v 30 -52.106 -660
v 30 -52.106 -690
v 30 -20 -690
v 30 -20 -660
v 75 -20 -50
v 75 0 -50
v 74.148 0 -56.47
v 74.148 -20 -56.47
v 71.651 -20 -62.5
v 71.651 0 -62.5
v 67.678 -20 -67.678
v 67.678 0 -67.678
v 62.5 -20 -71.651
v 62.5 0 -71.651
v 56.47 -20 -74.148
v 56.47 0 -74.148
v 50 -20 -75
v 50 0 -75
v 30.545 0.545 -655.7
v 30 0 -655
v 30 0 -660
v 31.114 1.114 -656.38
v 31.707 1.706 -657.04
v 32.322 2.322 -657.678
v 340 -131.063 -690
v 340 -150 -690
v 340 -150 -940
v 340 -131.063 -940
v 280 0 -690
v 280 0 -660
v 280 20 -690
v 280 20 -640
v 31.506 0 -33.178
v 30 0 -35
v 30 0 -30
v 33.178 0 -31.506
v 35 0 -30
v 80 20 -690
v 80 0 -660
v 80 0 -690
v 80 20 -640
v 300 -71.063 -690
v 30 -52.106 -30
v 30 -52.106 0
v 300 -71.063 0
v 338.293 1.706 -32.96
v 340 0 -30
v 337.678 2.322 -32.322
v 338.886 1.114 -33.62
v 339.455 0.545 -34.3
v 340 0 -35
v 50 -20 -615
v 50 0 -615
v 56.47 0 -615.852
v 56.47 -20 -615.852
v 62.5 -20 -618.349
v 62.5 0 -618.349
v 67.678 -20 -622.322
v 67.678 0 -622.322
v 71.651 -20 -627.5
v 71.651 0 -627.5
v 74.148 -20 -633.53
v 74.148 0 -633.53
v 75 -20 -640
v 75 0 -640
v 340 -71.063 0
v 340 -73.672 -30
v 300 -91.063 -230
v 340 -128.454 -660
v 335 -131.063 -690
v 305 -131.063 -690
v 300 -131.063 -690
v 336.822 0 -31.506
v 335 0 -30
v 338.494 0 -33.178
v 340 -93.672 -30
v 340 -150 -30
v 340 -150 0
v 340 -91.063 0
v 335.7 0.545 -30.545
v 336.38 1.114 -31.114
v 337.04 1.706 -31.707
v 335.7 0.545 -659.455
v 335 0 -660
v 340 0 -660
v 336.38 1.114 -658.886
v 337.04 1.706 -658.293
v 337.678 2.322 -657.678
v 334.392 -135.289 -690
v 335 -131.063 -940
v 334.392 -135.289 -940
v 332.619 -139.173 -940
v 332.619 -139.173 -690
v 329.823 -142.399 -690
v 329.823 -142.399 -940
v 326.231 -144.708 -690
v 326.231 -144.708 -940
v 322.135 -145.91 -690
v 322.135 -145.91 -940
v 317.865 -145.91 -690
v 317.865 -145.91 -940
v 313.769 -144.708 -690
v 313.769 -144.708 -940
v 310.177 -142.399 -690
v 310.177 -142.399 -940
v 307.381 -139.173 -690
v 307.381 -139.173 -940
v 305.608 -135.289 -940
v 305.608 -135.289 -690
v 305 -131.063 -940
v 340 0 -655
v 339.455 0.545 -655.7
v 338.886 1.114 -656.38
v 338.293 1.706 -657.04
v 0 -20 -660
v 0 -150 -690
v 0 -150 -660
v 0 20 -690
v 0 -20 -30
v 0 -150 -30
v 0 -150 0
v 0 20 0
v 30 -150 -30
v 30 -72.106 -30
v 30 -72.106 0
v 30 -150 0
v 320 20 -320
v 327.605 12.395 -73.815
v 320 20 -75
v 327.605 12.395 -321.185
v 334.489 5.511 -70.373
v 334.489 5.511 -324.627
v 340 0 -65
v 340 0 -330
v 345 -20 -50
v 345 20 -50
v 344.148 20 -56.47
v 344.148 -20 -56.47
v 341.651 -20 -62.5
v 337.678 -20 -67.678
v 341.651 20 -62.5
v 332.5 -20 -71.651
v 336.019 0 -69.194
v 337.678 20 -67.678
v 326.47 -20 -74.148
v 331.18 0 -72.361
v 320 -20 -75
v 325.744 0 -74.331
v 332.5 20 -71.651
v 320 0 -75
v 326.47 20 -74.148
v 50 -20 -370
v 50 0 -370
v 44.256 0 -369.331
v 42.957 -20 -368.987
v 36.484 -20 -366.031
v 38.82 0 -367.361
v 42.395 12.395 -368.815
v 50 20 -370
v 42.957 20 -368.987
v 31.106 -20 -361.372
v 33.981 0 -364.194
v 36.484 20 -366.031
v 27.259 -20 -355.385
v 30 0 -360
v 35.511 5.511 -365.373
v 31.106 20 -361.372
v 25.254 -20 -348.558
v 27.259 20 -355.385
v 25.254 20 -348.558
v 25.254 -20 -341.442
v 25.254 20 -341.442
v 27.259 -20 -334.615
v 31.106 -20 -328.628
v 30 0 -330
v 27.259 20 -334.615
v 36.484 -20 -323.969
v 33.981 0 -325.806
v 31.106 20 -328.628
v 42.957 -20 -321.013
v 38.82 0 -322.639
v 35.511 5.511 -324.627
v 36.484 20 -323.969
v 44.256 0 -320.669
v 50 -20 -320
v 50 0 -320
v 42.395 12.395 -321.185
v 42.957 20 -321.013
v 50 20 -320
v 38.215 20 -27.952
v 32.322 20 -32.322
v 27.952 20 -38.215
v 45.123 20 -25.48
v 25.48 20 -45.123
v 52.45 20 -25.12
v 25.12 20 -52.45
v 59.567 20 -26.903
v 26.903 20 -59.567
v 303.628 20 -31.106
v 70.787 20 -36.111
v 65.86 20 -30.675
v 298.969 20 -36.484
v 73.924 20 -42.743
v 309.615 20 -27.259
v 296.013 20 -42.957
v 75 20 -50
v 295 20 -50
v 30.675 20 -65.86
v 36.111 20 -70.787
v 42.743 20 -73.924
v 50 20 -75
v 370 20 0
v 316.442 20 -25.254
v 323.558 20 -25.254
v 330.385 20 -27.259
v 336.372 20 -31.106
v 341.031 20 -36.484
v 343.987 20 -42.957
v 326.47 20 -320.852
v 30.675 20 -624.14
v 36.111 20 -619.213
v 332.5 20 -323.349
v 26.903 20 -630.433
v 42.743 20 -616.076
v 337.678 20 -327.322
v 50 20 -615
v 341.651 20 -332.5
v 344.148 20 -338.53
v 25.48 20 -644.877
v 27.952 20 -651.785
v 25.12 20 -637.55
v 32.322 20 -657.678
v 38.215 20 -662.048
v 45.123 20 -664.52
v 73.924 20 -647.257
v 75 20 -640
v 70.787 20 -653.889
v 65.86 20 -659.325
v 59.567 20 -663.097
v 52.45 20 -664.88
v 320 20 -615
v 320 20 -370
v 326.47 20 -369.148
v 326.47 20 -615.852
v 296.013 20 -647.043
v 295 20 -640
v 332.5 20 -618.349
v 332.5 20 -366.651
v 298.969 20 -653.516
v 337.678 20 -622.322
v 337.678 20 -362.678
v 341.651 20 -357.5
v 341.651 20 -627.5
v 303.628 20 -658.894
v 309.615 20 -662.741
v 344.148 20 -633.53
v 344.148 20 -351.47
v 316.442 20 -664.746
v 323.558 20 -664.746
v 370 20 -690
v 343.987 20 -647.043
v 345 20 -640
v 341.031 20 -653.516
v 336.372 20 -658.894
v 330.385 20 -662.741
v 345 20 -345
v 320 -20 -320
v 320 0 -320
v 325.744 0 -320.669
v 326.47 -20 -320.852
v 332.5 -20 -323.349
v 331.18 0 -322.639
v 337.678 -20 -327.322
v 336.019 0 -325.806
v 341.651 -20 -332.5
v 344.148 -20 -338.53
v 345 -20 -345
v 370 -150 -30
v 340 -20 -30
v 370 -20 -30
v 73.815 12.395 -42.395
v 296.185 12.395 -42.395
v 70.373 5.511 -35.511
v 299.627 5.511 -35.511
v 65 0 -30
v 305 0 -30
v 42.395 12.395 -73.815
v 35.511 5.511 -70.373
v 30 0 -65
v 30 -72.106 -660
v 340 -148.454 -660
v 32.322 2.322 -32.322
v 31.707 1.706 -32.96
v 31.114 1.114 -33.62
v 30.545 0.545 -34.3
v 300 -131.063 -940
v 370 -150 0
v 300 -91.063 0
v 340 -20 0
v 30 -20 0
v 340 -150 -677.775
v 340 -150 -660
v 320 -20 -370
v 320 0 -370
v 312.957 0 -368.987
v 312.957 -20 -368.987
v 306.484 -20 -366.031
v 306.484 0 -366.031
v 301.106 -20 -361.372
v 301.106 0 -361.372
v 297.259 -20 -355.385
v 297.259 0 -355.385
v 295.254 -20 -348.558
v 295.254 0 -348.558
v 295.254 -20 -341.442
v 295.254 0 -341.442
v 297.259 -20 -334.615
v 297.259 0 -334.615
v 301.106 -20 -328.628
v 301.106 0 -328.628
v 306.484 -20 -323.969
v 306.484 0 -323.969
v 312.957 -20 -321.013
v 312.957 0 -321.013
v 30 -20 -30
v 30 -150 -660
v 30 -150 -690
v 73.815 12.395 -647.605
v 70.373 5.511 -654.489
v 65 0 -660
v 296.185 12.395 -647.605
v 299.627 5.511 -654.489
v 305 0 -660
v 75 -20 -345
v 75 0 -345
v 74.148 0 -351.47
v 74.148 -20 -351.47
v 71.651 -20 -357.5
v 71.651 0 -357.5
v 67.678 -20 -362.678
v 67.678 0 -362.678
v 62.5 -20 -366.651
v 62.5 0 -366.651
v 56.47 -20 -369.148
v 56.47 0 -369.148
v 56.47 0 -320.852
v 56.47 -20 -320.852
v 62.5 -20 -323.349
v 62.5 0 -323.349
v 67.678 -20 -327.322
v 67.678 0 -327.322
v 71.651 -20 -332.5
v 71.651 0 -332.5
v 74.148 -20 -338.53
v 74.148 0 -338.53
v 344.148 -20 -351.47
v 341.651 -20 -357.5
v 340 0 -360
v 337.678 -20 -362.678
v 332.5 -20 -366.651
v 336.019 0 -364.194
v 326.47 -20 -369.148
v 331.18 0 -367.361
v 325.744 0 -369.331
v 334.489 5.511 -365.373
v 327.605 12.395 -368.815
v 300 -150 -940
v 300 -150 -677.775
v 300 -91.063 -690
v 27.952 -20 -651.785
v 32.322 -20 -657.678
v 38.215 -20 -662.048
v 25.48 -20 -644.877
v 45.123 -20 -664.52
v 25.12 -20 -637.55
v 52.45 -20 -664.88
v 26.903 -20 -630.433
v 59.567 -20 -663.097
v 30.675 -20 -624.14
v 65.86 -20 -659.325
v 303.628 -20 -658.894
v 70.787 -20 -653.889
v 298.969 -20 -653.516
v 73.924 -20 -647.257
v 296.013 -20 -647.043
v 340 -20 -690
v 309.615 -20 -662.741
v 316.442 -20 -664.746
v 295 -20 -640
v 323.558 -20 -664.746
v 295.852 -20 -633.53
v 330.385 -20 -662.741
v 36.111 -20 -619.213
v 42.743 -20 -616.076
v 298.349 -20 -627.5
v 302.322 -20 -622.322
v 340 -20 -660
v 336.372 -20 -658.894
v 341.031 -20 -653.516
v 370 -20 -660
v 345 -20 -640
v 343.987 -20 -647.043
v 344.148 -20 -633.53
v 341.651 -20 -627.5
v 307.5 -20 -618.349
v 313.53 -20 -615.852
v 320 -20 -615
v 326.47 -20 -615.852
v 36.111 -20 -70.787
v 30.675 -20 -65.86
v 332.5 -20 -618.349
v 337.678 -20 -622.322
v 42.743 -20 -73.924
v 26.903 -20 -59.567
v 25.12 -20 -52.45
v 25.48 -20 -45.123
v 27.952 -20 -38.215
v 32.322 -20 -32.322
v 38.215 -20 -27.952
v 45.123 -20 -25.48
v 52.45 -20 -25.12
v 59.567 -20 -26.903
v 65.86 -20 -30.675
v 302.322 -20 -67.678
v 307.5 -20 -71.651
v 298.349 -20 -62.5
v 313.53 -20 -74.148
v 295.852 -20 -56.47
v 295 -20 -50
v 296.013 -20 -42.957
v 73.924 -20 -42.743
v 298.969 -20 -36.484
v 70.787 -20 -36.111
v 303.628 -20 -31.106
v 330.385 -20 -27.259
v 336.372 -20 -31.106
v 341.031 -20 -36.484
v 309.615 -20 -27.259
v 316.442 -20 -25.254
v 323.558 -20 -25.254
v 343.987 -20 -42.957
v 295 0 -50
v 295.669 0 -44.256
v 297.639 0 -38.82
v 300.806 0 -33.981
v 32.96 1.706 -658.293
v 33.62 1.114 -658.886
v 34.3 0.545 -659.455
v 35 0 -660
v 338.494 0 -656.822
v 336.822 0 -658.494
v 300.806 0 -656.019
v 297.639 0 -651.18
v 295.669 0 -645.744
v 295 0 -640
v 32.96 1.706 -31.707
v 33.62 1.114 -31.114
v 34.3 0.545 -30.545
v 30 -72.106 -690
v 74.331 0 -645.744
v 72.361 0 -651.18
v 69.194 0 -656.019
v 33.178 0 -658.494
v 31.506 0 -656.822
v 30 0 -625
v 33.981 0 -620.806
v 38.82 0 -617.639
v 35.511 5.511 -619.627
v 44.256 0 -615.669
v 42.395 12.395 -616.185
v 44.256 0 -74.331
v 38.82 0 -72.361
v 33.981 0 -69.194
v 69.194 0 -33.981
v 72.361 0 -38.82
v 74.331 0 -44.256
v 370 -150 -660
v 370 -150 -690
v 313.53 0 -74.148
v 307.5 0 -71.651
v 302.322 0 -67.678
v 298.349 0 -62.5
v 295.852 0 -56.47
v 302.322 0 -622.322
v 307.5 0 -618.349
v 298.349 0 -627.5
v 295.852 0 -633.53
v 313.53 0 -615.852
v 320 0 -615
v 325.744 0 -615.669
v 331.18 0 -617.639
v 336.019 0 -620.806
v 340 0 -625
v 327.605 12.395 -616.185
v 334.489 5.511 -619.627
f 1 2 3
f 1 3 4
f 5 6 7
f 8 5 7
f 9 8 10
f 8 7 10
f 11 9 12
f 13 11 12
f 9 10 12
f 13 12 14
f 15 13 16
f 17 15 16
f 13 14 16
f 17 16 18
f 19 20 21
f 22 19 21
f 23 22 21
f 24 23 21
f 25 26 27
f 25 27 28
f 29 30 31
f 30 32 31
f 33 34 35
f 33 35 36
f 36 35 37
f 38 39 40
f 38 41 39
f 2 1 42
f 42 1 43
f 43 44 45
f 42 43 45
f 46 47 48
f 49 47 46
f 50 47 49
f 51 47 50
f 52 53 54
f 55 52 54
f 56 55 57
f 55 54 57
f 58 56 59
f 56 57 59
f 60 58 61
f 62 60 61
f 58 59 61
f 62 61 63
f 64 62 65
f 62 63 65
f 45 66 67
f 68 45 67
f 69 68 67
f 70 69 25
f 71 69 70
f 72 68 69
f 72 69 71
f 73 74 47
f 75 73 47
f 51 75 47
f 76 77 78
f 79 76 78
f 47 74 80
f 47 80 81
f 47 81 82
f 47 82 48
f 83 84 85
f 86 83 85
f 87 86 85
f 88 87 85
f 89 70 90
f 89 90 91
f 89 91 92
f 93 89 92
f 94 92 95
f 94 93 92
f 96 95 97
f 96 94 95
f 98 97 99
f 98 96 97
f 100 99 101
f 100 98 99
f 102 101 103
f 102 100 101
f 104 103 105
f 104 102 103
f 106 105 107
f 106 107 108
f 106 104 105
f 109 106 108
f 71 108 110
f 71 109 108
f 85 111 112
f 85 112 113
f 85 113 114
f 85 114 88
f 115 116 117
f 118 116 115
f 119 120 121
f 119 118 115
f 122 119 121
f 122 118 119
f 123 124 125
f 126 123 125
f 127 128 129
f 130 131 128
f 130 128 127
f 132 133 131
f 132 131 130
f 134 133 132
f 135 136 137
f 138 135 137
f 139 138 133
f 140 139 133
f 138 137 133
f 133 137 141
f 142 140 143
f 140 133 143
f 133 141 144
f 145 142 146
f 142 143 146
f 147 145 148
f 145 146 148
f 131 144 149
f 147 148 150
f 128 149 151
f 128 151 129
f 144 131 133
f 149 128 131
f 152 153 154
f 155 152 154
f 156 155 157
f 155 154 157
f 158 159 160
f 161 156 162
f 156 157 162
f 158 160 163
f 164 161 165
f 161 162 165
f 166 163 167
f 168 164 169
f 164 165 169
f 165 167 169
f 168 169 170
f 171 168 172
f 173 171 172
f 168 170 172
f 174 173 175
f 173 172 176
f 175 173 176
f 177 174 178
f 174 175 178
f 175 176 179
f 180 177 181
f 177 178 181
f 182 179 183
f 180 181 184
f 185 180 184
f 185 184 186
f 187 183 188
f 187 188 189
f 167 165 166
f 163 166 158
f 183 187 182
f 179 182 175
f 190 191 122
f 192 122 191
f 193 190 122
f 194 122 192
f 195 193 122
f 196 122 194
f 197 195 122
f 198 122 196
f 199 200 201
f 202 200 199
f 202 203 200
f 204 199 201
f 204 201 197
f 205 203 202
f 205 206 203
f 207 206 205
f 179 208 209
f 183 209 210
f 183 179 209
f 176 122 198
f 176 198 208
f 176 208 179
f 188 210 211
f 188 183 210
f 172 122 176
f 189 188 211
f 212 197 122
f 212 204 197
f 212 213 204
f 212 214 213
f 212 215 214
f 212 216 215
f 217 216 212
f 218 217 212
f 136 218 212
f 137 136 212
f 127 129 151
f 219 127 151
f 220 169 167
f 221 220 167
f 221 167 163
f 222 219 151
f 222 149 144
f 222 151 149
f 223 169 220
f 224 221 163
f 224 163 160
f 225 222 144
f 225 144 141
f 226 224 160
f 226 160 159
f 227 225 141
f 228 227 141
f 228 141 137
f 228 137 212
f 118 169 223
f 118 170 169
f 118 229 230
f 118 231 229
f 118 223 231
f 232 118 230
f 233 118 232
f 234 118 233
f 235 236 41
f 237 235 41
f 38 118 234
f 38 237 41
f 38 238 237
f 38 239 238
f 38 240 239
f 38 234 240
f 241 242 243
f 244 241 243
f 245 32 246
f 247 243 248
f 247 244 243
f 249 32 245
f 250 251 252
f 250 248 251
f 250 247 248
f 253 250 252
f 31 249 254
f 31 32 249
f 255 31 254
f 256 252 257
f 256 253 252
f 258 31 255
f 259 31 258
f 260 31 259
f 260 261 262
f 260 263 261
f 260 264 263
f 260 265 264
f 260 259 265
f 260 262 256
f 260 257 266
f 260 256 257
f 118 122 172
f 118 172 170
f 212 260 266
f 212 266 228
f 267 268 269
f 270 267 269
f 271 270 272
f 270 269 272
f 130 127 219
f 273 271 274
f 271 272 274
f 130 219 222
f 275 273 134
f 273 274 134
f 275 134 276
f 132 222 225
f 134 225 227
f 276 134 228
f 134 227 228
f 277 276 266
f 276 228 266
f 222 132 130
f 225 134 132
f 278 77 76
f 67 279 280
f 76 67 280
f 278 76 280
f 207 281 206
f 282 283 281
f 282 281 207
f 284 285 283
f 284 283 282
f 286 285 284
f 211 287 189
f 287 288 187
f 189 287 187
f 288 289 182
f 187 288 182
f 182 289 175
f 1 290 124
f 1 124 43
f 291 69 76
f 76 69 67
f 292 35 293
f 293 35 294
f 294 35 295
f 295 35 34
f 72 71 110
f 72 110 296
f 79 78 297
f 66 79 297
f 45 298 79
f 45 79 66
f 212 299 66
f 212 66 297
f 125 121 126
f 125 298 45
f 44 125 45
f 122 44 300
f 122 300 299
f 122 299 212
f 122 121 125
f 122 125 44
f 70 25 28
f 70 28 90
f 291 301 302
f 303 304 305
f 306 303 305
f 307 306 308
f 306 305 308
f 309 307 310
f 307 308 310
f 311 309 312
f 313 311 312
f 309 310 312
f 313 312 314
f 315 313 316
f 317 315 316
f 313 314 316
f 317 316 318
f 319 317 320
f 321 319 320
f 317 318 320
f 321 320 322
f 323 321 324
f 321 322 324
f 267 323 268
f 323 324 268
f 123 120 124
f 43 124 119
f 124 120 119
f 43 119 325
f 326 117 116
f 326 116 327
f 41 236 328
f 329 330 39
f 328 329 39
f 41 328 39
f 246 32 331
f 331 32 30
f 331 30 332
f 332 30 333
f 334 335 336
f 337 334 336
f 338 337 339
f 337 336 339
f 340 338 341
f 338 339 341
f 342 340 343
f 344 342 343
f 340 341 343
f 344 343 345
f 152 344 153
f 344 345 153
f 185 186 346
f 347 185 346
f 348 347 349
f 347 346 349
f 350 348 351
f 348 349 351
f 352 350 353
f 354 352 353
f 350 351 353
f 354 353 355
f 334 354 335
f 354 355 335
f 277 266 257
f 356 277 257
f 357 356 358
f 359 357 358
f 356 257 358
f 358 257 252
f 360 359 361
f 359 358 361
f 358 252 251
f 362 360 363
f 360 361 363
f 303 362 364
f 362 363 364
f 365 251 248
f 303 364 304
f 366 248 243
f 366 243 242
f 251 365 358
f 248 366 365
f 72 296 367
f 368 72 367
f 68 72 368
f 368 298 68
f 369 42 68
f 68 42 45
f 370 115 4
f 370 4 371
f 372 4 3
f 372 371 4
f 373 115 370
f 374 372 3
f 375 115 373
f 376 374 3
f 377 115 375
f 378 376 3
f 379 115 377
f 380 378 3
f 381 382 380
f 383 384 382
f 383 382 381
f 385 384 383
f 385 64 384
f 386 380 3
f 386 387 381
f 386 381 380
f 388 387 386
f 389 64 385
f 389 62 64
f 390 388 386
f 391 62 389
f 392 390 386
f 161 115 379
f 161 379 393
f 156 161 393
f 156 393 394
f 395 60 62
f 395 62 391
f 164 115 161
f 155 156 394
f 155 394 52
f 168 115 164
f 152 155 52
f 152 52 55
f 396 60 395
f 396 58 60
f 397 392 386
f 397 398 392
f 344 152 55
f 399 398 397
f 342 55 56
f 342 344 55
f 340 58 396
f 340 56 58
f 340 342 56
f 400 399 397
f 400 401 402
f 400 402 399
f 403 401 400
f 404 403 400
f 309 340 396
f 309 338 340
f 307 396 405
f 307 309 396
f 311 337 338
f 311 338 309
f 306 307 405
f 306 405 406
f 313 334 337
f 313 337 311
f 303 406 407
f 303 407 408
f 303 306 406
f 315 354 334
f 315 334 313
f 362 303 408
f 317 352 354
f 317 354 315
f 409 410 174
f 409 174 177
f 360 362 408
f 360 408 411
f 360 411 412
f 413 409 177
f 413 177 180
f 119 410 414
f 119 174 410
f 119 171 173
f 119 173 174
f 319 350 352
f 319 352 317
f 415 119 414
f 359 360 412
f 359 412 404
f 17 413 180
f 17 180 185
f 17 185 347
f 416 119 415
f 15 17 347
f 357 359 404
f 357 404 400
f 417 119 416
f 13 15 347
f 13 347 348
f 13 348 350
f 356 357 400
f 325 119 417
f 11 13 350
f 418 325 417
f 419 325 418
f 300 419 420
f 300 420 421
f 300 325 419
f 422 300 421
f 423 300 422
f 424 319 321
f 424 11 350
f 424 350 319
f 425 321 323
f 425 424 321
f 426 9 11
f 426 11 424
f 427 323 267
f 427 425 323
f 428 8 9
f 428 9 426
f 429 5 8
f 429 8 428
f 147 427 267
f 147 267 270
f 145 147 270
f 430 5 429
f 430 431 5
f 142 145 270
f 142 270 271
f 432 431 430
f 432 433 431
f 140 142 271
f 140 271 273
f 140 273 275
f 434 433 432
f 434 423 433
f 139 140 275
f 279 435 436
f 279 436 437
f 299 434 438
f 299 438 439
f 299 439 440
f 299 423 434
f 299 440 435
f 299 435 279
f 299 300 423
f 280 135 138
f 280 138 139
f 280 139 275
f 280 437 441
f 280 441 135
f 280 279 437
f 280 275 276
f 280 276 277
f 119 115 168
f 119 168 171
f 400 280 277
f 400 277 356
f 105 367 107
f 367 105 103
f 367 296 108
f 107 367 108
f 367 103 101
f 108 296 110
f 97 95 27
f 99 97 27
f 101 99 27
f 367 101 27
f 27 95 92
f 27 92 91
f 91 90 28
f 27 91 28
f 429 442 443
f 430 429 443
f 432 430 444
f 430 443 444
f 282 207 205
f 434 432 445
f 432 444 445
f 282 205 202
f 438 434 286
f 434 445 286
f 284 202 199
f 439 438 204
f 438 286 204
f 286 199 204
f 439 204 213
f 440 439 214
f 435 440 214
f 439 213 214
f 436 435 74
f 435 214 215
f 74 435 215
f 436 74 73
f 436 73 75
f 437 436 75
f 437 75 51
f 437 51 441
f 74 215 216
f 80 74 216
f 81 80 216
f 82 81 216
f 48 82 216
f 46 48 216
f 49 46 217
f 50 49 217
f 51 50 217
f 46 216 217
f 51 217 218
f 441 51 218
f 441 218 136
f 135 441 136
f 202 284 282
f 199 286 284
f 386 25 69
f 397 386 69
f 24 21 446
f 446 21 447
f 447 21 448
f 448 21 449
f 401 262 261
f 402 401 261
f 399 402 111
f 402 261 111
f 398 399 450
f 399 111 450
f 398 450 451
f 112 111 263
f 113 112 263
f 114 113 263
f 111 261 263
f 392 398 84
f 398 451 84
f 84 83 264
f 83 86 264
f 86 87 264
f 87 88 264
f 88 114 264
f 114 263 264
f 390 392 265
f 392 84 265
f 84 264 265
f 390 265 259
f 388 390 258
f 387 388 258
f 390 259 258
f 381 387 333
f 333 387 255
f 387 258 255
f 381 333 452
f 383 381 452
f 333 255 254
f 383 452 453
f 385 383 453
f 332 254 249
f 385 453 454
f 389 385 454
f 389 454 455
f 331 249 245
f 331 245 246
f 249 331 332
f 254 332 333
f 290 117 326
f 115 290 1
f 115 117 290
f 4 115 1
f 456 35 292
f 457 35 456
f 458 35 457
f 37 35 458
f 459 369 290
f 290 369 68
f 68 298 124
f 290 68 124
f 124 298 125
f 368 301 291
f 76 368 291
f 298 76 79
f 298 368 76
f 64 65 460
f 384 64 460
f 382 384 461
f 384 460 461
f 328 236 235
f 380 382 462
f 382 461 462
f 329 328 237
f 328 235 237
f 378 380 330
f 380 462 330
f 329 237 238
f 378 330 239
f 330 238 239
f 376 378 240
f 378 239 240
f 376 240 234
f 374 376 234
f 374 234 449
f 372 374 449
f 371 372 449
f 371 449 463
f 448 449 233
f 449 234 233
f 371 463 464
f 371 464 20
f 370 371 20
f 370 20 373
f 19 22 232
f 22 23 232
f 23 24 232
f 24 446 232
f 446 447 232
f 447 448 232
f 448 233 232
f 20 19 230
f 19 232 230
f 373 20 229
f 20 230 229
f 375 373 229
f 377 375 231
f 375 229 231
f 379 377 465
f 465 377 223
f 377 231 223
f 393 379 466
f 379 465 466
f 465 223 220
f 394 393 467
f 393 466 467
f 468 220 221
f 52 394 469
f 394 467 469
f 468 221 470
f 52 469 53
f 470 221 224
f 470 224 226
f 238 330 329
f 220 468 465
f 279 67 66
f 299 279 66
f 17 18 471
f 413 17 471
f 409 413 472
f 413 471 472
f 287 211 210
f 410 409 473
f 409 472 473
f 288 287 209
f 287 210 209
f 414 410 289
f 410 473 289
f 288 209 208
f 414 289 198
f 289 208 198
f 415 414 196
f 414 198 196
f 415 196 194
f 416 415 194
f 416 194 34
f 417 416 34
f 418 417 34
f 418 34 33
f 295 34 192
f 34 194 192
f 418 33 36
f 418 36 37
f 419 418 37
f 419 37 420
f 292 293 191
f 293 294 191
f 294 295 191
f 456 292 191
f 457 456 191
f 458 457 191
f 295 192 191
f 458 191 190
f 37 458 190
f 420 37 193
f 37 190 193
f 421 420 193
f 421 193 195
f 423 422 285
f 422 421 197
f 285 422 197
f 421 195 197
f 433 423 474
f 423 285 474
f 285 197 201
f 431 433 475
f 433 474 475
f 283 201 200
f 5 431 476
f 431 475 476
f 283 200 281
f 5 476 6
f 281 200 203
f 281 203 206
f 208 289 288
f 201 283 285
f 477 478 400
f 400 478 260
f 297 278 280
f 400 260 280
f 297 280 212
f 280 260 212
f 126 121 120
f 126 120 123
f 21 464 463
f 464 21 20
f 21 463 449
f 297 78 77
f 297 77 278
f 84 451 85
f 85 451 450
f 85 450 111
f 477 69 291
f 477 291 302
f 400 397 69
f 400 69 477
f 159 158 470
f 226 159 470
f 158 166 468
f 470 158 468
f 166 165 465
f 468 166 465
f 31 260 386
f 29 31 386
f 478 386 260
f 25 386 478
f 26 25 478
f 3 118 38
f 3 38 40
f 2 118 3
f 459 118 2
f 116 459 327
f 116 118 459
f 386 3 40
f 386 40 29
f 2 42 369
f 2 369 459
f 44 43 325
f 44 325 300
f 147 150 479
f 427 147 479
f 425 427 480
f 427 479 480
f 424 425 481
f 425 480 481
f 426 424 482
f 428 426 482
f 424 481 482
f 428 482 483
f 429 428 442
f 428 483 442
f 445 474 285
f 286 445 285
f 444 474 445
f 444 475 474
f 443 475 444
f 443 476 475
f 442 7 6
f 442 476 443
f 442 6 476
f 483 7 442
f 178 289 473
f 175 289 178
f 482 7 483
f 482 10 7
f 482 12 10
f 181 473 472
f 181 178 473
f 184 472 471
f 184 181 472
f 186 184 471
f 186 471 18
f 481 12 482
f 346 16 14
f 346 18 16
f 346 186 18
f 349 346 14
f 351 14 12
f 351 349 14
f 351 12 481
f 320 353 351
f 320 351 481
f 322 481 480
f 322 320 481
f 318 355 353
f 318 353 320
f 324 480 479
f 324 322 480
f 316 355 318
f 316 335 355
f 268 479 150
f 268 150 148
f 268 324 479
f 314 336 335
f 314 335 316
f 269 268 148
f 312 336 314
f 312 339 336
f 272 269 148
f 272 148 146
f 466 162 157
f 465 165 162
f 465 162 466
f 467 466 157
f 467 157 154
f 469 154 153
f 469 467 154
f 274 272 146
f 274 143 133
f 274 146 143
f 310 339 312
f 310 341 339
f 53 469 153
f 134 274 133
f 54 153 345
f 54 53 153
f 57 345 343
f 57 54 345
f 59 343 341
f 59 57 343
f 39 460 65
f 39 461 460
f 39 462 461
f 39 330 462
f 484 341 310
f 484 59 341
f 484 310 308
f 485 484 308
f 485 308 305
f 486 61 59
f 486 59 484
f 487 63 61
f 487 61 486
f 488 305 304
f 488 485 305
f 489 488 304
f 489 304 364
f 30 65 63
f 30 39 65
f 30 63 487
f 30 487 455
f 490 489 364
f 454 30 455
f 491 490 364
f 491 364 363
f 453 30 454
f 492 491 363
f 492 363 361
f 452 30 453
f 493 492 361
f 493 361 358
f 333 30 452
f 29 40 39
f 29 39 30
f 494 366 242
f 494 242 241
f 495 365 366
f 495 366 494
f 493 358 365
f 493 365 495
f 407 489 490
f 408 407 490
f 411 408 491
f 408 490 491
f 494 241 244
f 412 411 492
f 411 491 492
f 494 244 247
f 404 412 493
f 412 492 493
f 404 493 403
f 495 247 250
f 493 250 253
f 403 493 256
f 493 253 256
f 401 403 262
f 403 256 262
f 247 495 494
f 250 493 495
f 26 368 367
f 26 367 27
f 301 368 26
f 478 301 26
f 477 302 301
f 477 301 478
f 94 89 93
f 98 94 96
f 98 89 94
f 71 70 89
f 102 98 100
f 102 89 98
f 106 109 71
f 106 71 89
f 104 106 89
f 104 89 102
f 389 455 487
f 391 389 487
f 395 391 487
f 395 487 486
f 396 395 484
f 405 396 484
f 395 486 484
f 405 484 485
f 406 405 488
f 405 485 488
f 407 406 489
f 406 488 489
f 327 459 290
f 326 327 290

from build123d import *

# Parameters (mm, degrees)
SKETCH2_W            = 370
SKETCH2_H            = 690
SKETCH2_W_2          = 270
SKETCH2_H_2          = 590
BOSS_EXTRUDE1_DEPTH  = 20
CHAMFER1_SIZE        = 20
SKETCH10_W           = 370
SKETCH10_H           = 690
BOSS_EXTRUDE6_DEPTH  = 20
CUT_EXTRUDE3_DEPTH   = 784.964284901
SKETCH11_W           = 30
SKETCH11_H           = 30
BOSS_EXTRUDE7_DEPTH  = 130
SKETCH13_W           = 200
SKETCH13_H           = 50
CUT_EXTRUDE4_DEPTH   = 20
BOSS_EXTRUDE11_DEPTH = 690
BOSS_EXTRUDE15_DEPTH = 40
SKETCH21_W           = 0.428939058
SKETCH21_H           = 0.058642304
SKETCH21_W_2         = 75.212075904
SKETCH21_H_2         = 45.043559158
CUT_EXTRUDE6_DEPTH   = 17
BOSS_EXTRUDE16_DEPTH = 250


with BuildPart() as part:
    # Sketch2 → Boss-Extrude1 (new body)
    with BuildSketch(Plane(origin=(0, 0, 0), x_dir=(1, 0, 0), z_dir=(0, 1, 0))):
        with Locations((185, 345)):
            Rectangle(SKETCH2_W, SKETCH2_H)
        with Locations((185, 345)):
            Rectangle(SKETCH2_W_2, SKETCH2_H_2, mode=Mode.SUBTRACT)
    extrude(amount=BOSS_EXTRUDE1_DEPTH)

    # Chamfer1
    chamfer1_edges = [part.edges().sort_by_distance(p)[0] for p in [
        (185, 0, -640),
        (320, 0, -345),
        (185, 0, -50),
        (50, 0, -345),
    ]]
    chamfer(chamfer1_edges, length=CHAMFER1_SIZE - 0.0001)  # a hair under: the kernel refuses the full size

    # Sketch10 → Boss-Extrude6 (add)
    with BuildSketch(Plane.XZ):
        with Locations((185, -345)):
            Rectangle(SKETCH10_W, SKETCH10_H)
    extrude(amount=BOSS_EXTRUDE6_DEPTH)

    # Sketch4 → Cut-Extrude3 (cut, through all)
    with BuildSketch(Plane(origin=(0, 20, 0), x_dir=(1, 0, 0), z_dir=(0, 1, 0))):
        with BuildLine():
            ThreePointArc((320, 615), (337.67766953, 622.32233047), (345, 640))
            ThreePointArc((345, 640), (320, 665), (295, 640))
            Line((295, 640), (320, 640))
            Line((320, 640), (320, 615))
        make_face()
        with BuildLine():
            Line((320, 640), (295, 640))
            ThreePointArc((295, 640), (302.32233047, 622.32233047), (320, 615))
            Line((320, 615), (320, 640))
        make_face()
        with BuildLine():
            Line((50, 640), (75, 640))
            ThreePointArc((75, 640), (32.32233047, 657.67766953), (50, 615))
            Line((50, 615), (50, 640))
        make_face()
        with BuildLine():
            ThreePointArc((50, 615), (67.67766953, 622.32233047), (75, 640))
            Line((75, 640), (50, 640))
            Line((50, 640), (50, 615))
        make_face()
        with BuildLine():
            Line((50, 320), (50, 370))
            ThreePointArc((50, 370), (25, 345), (50, 320))
        make_face()
        with BuildLine():
            ThreePointArc((75, 345), (67.67766953, 362.67766953), (50, 370))
            Line((50, 370), (50, 320))
            ThreePointArc((50, 320), (67.67766953, 327.32233047), (75, 345))
        make_face()
        with BuildLine():
            Line((50, 50), (50, 75))
            ThreePointArc((50, 75), (32.32233047, 32.32233047), (75, 50))
            Line((75, 50), (50, 50))
        make_face()
        with BuildLine():
            ThreePointArc((75, 50), (67.67766953, 67.67766953), (50, 75))
            Line((50, 75), (50, 50))
            Line((50, 50), (75, 50))
        make_face()
        with BuildLine():
            Line((320, 50), (320, 75))
            ThreePointArc((320, 75), (302.32233047, 67.67766953), (295, 50))
            Line((295, 50), (320, 50))
        make_face()
        with BuildLine():
            ThreePointArc((345, 50), (337.67766953, 67.67766953), (320, 75))
            Line((320, 75), (320, 50))
            Line((320, 50), (295, 50))
            ThreePointArc((295, 50), (320, 25), (345, 50))
        make_face()
        with BuildLine():
            Line((320, 320), (320, 370))
            ThreePointArc((320, 370), (295, 345), (320, 320))
        make_face()
        with BuildLine():
            ThreePointArc((345, 345), (337.67766953, 362.67766953), (320, 370))
            Line((320, 370), (320, 320))
            ThreePointArc((320, 320), (337.67766953, 327.32233047), (345, 345))
        make_face()
    extrude(amount=-CUT_EXTRUDE3_DEPTH, mode=Mode.SUBTRACT)

    # Sketch11 → Boss-Extrude7 (add)
    with BuildSketch(Plane.XZ.offset(20)):
        with Locations((15, -15)):
            Rectangle(SKETCH11_W, SKETCH11_H)
        with Locations((355, -15)):
            Rectangle(SKETCH11_W, SKETCH11_H)
        with Locations((15, -675)):
            Rectangle(SKETCH11_W, SKETCH11_H)
        with Locations((355, -675)):
            Rectangle(SKETCH11_W, SKETCH11_H)
    extrude(amount=BOSS_EXTRUDE7_DEPTH)

    # Sketch13 → Cut-Extrude4 (cut)
    with BuildSketch(Plane(origin=(0, 20, 0), x_dir=(1, 0, 0), z_dir=(0, 1, 0))):
        with Locations((180, 665)):
            Rectangle(SKETCH13_W, SKETCH13_H)
    extrude(amount=-CUT_EXTRUDE4_DEPTH, mode=Mode.SUBTRACT)

    # Sketch14 → Boss-Extrude11 (add)
    with BuildSketch(Plane.XY):
        Polygon((30, -52.106305214), (300, -71.063052139), (300, -91.063052139), (30, -72.106305214), align=None)
    extrude(amount=-BOSS_EXTRUDE11_DEPTH)

    # Sketch19 → Boss-Extrude15 (add)
    with BuildSketch(Plane(origin=(300, 0, 0), x_dir=(0, 0, -1), z_dir=(1, 0, 0))):
        Polygon((0, -71.063052139), (690, -131.063052139), (690, -151.063052139), (0, -91.063052139), align=None)
    extrude(amount=BOSS_EXTRUDE15_DEPTH)

    # Sketch21 → Cut-Extrude6 (cut)
    with BuildSketch(Plane.XZ.offset(150)):
        with Locations((372.006097864, -651.747092541)):
            Rectangle(SKETCH21_W, SKETCH21_H)
        with Locations((331.793311609, -674.26887212)):
            Rectangle(SKETCH21_W_2, SKETCH21_H_2)
    extrude(amount=CUT_EXTRUDE6_DEPTH, mode=Mode.SUBTRACT)

    # Sketch22 → Boss-Extrude16 (add)
    with BuildSketch(Plane(origin=(0, 0, -690), x_dir=(-1, 0, 0), z_dir=(0, 0, -1))):
        with BuildLine():
            Line((-305, -131.063052139), (-300, -131.063052139))
            Line((-300, -131.063052139), (-300, -150))
            Line((-300, -150), (-340, -150))
            Line((-340, -150), (-340, -131.063052139))
            Line((-340, -131.063052139), (-335, -131.063052139))
            ThreePointArc((-335, -131.063052139), (-320, -146.063052139), (-305, -131.063052139))
        make_face()
    extrude(amount=BOSS_EXTRUDE16_DEPTH)


solid = part.part
